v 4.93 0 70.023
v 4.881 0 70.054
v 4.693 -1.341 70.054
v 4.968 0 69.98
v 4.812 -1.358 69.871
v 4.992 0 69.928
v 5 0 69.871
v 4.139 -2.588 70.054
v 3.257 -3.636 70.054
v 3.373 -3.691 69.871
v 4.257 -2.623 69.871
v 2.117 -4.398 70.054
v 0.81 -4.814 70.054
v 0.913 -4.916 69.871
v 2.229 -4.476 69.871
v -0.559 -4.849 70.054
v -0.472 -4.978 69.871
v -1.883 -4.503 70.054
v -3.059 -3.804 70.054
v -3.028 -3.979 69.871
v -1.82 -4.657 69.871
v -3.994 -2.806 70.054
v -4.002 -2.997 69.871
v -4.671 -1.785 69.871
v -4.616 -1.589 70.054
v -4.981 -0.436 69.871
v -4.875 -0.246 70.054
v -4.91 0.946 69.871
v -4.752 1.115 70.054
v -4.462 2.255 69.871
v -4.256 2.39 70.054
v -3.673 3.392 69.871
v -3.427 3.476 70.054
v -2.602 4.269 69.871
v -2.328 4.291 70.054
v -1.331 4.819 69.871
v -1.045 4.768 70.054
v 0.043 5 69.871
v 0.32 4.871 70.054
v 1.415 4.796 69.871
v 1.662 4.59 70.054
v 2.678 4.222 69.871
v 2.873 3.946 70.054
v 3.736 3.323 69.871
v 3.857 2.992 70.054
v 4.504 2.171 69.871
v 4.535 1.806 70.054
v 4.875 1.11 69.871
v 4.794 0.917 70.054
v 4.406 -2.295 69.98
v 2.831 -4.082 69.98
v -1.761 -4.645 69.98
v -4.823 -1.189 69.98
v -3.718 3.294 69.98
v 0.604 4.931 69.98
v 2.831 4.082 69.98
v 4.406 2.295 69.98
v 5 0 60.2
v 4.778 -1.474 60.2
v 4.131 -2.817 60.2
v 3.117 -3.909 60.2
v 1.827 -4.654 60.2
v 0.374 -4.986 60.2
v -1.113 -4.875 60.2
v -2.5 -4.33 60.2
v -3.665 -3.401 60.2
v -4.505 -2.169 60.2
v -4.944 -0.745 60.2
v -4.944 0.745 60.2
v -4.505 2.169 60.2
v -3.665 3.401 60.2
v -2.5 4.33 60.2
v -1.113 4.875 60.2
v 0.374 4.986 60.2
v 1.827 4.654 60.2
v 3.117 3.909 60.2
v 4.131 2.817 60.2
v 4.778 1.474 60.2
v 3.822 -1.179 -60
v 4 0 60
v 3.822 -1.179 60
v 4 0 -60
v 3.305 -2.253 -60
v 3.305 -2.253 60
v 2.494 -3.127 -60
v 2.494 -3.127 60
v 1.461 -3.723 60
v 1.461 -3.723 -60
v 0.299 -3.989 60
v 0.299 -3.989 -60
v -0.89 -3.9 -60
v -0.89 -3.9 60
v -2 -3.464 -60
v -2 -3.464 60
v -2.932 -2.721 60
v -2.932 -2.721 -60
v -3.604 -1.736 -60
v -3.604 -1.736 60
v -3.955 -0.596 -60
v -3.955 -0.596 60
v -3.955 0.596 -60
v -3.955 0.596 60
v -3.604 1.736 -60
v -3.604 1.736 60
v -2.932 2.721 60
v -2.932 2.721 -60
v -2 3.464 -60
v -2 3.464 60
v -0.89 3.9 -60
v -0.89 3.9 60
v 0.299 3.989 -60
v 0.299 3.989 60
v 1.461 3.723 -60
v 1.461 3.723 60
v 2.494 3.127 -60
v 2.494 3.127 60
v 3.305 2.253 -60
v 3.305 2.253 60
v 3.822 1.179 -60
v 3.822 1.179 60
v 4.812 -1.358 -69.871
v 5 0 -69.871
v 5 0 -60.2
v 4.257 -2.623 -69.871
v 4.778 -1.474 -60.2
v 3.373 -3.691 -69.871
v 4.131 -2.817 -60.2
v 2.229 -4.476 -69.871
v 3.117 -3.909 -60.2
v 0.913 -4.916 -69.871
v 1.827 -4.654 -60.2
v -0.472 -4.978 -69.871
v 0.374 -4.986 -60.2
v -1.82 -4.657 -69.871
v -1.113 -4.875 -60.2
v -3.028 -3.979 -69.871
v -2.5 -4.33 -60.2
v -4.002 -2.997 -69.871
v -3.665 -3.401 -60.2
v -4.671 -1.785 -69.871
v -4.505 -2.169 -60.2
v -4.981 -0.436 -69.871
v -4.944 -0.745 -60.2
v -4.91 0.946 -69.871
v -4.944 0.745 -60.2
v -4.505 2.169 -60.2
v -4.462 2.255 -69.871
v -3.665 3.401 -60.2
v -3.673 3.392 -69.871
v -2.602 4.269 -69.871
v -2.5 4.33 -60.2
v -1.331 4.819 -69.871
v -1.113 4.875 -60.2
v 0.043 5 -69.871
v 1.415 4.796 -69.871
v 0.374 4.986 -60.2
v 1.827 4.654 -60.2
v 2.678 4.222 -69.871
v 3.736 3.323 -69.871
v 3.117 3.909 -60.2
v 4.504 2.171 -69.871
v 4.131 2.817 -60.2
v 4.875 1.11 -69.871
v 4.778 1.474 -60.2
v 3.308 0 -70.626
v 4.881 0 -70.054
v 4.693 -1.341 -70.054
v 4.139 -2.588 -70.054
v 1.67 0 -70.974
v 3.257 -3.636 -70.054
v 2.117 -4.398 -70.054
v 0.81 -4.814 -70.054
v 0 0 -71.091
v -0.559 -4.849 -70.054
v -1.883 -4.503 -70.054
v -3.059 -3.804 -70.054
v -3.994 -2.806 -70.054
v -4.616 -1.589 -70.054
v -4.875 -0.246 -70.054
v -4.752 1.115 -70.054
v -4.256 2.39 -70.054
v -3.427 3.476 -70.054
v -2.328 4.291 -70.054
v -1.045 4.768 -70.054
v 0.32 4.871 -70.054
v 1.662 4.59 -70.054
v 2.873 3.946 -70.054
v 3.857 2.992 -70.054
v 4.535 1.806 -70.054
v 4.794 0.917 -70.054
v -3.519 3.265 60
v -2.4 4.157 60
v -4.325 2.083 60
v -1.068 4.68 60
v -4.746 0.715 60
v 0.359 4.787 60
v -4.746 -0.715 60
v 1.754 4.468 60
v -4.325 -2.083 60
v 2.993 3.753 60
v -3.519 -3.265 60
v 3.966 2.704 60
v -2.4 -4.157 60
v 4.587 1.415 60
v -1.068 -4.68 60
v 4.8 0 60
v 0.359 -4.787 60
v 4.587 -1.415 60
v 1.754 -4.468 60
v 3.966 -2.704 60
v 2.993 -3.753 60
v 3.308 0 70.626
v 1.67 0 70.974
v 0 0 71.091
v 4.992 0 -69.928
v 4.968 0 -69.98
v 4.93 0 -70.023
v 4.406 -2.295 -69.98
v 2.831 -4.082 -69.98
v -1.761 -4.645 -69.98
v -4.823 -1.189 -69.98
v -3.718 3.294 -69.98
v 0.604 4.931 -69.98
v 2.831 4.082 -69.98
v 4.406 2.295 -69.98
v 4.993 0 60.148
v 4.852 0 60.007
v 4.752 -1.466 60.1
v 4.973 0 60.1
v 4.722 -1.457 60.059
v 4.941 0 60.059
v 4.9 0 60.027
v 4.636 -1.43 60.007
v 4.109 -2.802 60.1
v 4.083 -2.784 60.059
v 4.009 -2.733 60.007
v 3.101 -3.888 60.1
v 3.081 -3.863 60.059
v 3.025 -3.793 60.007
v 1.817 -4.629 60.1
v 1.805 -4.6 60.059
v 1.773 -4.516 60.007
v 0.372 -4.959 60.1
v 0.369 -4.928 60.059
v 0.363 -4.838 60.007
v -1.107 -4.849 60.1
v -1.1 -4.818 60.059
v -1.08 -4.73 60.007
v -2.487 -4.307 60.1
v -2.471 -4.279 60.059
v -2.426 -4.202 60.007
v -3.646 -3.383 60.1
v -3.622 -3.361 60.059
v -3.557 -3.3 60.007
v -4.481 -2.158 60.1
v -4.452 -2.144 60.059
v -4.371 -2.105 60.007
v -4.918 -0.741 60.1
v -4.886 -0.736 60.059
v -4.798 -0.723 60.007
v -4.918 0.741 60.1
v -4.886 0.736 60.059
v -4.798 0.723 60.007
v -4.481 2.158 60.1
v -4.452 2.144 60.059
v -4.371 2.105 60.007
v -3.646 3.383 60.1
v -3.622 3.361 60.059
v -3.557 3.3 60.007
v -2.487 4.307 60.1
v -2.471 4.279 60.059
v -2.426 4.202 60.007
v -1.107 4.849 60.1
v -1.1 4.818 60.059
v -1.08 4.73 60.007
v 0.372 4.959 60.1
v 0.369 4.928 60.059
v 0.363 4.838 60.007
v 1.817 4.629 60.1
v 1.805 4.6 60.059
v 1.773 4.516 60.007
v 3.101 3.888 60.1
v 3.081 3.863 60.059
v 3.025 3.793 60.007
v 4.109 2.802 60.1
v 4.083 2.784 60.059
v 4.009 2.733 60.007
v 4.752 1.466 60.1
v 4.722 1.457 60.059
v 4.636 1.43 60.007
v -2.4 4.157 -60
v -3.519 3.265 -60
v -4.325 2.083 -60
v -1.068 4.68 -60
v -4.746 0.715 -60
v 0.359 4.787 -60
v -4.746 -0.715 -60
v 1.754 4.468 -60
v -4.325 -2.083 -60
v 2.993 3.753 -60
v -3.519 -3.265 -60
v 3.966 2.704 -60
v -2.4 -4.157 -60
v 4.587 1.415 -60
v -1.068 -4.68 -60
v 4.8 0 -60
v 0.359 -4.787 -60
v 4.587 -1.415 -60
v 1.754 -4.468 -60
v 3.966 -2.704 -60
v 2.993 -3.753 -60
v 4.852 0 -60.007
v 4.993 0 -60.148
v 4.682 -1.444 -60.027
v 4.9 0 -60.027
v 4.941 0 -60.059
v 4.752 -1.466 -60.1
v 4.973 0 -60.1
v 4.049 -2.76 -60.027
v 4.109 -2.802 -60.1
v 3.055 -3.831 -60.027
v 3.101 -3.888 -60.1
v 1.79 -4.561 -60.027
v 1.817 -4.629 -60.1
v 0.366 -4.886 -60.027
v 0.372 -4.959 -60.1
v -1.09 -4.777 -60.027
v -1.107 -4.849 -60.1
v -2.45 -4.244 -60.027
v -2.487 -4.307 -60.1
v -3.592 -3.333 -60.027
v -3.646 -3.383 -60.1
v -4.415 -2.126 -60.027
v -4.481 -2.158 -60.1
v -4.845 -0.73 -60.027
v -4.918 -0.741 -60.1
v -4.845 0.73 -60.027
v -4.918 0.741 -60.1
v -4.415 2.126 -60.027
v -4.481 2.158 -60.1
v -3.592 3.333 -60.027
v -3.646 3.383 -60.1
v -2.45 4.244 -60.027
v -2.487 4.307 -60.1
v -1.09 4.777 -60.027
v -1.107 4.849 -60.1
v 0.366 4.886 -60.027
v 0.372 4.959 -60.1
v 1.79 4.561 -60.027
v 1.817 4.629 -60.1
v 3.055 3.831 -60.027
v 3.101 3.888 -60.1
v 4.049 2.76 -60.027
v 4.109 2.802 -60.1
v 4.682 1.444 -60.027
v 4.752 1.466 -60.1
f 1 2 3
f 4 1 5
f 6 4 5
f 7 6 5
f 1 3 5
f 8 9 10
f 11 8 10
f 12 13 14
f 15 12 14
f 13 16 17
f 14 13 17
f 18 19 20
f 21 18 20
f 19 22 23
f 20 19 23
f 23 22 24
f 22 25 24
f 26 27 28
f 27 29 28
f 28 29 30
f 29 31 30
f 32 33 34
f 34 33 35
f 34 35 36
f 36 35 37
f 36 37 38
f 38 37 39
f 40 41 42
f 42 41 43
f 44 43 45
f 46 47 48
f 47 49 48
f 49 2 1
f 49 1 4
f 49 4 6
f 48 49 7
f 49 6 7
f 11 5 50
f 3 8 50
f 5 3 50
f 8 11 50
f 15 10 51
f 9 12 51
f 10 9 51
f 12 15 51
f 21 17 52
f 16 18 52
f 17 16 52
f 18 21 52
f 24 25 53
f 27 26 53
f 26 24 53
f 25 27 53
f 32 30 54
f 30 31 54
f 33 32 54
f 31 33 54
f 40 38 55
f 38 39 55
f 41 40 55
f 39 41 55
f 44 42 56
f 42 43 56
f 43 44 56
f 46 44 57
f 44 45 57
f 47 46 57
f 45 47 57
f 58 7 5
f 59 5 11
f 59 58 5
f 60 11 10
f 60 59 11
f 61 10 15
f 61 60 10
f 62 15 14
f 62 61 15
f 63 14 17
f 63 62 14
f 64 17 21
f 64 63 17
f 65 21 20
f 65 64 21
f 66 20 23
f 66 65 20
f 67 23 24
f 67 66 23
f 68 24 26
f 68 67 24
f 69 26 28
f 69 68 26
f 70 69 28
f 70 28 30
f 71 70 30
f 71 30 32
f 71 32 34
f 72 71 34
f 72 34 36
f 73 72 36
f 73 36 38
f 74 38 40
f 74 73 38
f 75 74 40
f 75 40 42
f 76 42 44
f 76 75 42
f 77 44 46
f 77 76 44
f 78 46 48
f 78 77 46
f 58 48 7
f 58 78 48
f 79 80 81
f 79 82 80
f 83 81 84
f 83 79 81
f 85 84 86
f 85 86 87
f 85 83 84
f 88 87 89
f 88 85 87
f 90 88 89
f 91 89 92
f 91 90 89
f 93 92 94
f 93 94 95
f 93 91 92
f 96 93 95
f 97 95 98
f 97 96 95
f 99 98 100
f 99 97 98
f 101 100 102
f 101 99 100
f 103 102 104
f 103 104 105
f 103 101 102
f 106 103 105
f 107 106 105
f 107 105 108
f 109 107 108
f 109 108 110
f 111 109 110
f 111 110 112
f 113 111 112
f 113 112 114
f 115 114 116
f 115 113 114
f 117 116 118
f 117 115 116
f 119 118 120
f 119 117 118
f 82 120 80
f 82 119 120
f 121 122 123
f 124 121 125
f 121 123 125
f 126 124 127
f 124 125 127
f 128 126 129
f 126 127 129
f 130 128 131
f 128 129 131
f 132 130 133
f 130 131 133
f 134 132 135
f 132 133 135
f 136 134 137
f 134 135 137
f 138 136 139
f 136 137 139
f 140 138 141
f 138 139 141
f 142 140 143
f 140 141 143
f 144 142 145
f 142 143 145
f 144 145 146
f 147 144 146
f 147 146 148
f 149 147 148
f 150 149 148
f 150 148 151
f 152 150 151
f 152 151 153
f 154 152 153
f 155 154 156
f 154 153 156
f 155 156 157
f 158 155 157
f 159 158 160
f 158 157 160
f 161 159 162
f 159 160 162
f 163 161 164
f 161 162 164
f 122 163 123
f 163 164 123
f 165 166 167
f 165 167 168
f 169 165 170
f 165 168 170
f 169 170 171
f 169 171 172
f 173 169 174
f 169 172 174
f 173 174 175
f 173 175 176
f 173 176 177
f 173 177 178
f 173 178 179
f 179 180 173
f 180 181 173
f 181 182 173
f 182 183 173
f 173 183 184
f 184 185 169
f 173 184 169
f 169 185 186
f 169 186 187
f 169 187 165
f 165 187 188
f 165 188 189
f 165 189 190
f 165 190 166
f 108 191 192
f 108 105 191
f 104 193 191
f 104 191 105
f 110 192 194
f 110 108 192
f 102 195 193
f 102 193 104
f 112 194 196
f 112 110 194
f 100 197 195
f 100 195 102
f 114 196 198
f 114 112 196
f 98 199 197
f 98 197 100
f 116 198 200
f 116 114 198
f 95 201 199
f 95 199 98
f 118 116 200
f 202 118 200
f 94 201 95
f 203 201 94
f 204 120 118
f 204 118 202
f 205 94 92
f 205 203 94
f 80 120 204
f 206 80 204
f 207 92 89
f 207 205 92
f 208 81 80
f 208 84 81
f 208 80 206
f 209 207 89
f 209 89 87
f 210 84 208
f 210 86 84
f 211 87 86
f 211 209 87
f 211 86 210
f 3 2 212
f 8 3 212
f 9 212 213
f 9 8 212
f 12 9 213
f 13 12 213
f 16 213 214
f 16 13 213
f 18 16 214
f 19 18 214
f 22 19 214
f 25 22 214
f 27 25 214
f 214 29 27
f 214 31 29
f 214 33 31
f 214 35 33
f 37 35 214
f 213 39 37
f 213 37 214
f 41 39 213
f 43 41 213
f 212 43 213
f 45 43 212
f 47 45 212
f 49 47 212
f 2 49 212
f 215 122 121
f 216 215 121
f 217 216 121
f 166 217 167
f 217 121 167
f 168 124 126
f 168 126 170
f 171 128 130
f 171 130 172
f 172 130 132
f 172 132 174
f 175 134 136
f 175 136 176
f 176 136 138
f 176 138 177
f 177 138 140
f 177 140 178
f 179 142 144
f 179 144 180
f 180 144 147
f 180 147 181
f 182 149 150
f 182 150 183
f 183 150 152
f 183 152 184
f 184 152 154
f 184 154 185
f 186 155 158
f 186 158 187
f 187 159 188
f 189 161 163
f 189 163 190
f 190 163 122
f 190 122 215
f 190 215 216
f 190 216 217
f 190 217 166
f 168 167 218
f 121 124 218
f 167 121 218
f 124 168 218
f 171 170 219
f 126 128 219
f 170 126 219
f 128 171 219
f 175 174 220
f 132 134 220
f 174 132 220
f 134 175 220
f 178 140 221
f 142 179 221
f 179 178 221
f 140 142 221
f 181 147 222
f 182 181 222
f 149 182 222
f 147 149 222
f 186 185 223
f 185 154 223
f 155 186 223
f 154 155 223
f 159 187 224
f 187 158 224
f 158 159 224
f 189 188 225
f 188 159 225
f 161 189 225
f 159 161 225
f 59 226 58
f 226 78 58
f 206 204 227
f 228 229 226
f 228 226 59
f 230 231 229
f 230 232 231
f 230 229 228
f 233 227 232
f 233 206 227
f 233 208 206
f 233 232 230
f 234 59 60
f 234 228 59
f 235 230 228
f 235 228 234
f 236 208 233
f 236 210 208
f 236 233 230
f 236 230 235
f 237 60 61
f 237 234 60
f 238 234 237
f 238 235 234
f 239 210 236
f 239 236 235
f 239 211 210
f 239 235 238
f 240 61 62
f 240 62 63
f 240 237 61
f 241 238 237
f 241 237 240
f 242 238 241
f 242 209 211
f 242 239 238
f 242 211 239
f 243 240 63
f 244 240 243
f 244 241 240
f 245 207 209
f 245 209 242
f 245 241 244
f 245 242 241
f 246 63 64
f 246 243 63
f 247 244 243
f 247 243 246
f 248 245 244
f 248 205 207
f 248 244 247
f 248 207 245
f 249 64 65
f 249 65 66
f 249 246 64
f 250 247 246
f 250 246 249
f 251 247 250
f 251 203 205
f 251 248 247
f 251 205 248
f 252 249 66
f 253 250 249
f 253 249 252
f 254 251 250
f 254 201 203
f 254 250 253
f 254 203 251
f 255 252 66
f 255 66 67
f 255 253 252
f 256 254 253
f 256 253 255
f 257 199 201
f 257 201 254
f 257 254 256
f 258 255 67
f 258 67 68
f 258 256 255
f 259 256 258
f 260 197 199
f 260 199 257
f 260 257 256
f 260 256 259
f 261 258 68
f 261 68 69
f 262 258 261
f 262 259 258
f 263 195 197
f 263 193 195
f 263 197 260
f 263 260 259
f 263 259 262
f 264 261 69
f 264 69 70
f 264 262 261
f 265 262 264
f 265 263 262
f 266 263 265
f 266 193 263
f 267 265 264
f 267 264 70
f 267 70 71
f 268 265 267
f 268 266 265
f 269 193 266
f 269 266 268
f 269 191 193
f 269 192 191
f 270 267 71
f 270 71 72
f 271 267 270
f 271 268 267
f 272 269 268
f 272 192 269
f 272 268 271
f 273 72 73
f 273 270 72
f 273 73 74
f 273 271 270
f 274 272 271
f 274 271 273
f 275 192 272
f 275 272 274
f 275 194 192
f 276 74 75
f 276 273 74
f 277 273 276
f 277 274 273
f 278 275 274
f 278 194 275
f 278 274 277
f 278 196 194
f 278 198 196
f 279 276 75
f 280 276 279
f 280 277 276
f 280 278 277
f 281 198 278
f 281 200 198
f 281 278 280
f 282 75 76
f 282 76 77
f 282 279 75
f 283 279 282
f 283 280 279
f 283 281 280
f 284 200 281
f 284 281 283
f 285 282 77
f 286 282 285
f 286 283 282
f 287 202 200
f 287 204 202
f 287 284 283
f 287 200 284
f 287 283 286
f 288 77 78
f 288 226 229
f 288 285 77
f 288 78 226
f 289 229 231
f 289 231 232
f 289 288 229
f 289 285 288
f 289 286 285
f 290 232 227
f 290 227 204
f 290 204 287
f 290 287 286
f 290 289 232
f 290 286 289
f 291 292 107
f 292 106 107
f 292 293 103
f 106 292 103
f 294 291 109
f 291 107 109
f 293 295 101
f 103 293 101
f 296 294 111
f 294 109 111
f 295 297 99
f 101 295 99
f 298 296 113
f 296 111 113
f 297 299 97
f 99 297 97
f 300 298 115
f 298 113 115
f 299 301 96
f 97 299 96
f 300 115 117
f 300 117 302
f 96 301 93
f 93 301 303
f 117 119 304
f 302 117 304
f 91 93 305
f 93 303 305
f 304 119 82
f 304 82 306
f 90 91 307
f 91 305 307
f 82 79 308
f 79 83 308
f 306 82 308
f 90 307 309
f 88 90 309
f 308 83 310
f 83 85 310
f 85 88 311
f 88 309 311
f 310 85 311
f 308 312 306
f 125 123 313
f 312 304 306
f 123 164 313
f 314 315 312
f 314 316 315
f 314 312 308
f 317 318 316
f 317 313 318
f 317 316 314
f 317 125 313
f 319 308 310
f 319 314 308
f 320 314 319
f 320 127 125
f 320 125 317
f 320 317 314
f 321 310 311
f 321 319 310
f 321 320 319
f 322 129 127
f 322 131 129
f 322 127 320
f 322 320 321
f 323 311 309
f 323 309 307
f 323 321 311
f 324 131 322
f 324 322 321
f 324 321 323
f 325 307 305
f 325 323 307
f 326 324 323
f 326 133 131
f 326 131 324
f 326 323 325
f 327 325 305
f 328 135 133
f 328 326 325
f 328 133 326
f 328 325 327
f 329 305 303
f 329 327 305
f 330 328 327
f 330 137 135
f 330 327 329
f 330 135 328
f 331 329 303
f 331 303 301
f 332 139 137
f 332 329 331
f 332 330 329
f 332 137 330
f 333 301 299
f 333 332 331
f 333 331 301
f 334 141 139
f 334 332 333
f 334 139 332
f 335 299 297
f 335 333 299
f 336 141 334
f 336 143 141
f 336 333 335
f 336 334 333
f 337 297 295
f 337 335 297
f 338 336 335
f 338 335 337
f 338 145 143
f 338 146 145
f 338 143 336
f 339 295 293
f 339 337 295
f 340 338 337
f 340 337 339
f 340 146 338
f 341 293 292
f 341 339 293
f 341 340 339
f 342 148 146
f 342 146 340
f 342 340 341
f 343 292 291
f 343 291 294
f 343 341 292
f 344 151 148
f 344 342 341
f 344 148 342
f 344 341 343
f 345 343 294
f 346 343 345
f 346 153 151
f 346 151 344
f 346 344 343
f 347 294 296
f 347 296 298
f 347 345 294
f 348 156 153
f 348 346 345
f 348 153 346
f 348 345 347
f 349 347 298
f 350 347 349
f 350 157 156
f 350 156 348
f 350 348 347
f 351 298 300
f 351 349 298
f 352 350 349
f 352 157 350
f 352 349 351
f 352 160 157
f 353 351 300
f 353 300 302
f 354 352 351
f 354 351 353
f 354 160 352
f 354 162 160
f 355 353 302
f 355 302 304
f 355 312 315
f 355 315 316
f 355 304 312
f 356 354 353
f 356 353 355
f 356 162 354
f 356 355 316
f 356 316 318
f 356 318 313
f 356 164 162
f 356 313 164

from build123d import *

# Parameters (mm, degrees)
FILLET1_R = 0.2


with BuildPart() as part:
    # Sketch1 → Revolve1 (revolve)
    with BuildSketch(Plane(origin=(0, 0, 0), x_dir=(0, 0, -1), z_dir=(1, 0, 0)), mode=Mode.PRIVATE) as revolve1_sk:
        with BuildLine():
            Line((0, 0), (71.091287885, 0))
            ThreePointArc((71.091287885, 0), (70.815292009, 2.558852734), (70, 5))
            Line((70, 5), (60, 5))
            Line((60, 5), (60, 4))
            Line((60, 4), (0, 4))
            Line((0, 4), (0, 0))
        make_face()
    revolve(revolve1_sk.sketch.rotate(Axis((0, 0, 0), (0, 0, -1)), 90), axis=Axis((0, 0, 0), (0, 0, -1)))

    # Mirror1: part across plane


with BuildPart() as part_1:
    add(part.part)
    add(part.part.mirror(Plane.XY))

    # Fillet1
    fillet1_edges = [part_1.edges().sort_by_distance(p)[0] for p in [
        (-5, 0, 60),
        (-5, 0, 70),
        (-5, 0, -70),
        (-5, 0, -60),
    ]]
    fillet(fillet1_edges, radius=FILLET1_R)


solid = part_1.part
